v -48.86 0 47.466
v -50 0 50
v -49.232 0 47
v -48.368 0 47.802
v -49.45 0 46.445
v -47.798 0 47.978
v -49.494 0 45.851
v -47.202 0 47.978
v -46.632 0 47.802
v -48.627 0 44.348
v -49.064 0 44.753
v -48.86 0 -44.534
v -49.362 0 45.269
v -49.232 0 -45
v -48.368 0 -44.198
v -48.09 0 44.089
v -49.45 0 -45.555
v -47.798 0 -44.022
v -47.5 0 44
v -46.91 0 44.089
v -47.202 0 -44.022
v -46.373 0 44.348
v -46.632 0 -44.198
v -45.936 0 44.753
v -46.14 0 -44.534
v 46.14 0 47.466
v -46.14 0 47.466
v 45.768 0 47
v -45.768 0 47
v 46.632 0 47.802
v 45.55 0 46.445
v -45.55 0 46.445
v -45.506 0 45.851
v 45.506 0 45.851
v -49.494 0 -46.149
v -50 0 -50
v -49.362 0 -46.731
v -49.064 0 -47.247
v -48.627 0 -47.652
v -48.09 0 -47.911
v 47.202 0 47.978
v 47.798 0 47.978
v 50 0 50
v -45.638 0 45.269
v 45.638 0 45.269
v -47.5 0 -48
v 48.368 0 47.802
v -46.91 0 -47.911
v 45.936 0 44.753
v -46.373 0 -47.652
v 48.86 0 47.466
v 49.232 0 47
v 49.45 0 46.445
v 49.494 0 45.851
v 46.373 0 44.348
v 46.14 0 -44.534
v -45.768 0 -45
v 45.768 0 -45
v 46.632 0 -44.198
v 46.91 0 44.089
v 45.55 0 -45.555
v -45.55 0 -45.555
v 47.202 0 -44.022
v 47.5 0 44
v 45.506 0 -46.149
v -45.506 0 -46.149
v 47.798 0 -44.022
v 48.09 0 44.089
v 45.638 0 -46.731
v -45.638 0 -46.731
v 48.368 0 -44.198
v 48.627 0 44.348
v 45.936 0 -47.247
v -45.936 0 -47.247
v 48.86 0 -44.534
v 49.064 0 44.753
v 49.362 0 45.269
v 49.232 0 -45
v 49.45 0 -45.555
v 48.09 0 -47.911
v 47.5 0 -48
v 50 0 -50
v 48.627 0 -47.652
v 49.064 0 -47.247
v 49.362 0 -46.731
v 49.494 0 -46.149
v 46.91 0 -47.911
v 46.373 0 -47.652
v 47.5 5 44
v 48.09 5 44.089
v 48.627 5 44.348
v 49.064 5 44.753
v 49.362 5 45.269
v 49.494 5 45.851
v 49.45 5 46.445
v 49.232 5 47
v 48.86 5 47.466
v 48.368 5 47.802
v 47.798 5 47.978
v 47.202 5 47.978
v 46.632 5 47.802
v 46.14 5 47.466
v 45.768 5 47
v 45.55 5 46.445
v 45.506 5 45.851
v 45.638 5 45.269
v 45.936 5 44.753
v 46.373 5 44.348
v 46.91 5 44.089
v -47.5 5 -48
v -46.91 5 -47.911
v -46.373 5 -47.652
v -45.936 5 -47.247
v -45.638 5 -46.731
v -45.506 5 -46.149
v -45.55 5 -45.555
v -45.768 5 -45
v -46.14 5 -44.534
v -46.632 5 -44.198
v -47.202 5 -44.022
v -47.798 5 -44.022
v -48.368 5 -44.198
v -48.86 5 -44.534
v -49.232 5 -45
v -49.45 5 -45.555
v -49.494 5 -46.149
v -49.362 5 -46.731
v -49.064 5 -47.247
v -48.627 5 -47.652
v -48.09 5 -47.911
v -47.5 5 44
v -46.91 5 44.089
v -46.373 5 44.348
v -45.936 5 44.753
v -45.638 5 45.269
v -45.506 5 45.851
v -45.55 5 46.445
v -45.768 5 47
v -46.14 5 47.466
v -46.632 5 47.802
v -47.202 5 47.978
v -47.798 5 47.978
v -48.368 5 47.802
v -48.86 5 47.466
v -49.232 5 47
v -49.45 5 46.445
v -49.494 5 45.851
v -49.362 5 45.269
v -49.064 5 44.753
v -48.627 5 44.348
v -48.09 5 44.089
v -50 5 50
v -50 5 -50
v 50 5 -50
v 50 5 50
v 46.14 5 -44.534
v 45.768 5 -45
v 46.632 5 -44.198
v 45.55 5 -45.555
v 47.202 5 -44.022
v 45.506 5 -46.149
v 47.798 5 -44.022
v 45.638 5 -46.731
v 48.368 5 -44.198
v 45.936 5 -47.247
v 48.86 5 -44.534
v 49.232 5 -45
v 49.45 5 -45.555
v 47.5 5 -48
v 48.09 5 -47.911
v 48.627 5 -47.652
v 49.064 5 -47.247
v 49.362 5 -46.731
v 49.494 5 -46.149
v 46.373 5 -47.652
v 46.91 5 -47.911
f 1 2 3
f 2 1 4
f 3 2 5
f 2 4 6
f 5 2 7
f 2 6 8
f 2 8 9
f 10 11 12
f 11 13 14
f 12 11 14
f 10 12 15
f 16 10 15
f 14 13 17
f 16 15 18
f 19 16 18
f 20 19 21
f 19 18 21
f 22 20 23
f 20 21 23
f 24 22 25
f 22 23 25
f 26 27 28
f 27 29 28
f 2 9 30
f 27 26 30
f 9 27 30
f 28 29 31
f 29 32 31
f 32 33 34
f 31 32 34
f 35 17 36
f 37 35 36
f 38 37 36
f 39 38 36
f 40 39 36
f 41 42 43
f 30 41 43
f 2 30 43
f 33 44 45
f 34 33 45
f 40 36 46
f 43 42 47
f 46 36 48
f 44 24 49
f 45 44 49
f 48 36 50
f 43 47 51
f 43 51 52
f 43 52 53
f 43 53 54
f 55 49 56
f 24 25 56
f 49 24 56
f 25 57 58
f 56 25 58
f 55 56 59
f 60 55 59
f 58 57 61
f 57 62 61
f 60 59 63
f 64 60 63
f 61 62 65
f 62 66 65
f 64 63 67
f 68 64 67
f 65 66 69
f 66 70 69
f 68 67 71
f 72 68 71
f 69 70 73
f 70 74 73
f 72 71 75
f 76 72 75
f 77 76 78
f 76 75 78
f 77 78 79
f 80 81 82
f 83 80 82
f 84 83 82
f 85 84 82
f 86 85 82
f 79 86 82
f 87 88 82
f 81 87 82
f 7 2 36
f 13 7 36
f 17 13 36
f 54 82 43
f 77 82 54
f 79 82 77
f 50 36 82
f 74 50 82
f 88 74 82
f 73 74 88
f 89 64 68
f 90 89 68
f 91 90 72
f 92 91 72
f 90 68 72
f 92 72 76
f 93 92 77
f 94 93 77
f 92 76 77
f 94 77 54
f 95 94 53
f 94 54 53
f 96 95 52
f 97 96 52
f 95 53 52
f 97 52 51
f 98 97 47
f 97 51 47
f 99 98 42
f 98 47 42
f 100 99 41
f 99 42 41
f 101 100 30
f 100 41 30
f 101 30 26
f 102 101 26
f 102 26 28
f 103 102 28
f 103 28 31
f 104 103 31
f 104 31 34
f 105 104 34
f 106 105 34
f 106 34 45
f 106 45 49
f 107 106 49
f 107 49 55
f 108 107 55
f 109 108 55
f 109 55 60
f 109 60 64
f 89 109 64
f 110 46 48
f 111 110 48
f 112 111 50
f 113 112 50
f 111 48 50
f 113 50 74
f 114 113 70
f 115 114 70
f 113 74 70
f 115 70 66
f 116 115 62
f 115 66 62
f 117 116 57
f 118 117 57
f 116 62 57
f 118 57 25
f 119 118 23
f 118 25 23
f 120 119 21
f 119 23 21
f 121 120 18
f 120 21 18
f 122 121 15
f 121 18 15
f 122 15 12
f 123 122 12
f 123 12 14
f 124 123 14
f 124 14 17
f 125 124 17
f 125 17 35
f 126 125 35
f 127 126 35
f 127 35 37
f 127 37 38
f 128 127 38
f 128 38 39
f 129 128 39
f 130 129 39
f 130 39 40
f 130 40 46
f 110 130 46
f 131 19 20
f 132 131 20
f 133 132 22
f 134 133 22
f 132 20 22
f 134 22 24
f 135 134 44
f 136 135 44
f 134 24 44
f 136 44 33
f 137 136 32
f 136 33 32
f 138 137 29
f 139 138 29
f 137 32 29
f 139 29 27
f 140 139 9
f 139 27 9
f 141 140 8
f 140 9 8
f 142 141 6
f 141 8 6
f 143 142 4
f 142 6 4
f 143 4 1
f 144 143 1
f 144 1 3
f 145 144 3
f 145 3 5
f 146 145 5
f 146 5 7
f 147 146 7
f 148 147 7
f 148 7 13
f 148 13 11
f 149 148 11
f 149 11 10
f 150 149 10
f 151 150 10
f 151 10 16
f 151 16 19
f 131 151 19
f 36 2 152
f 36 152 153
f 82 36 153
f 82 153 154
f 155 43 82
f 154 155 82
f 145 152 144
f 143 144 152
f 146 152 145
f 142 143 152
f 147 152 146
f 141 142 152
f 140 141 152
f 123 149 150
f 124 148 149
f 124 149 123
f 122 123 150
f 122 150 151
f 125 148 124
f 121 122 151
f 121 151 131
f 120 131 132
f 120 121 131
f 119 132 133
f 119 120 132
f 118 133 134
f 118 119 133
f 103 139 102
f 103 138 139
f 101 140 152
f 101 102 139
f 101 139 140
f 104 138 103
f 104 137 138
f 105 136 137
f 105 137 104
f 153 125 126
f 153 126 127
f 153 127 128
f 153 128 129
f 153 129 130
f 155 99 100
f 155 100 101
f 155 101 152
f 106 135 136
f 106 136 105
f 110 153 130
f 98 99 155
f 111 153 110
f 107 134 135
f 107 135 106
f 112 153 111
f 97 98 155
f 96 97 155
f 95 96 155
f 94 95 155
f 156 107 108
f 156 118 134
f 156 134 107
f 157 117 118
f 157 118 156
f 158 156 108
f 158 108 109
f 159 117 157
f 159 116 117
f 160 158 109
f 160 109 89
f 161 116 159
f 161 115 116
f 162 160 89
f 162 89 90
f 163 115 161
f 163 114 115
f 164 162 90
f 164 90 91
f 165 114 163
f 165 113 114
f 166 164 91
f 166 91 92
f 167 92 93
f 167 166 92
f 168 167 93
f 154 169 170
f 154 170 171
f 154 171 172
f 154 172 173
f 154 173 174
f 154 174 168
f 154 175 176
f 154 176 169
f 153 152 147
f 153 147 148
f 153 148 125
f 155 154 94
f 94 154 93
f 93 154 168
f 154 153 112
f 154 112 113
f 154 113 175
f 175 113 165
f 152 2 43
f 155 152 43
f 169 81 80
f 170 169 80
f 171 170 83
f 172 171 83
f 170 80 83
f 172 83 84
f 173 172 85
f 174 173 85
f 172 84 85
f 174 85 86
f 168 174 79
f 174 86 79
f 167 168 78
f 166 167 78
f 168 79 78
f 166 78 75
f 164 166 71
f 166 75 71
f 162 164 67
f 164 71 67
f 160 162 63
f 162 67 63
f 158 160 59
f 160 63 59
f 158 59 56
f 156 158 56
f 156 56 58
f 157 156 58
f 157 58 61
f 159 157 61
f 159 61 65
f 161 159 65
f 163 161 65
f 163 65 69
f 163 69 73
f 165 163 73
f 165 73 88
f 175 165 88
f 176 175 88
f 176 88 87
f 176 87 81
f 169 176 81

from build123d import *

# Parameters (mm, degrees)
SKETCH1_W                 = 100
SKETCH1_H                 = 100
BOSS_EXTRUDE1_DEPTH       = 5
F_4_0MM_DOWEL_HOLE1_D     = 4
F_4_0MM_DOWEL_HOLE1_DEPTH = 5


with BuildPart() as part:
    # Sketch1 → Boss-Extrude1 (new body)
    with BuildSketch(Plane(origin=(0, 0, 0), x_dir=(1, 0, 0), z_dir=(0, 1, 0))):
        Rectangle(SKETCH1_W, SKETCH1_H)
    extrude(amount=BOSS_EXTRUDE1_DEPTH)

    # Ø4.0mm Dowel Hole1
    with Locations(Plane(origin=(-47.5, 5, -46), x_dir=(0, 0, 1), z_dir=(0, 1, 0))):
        with Locations((0, 0), (0, 95), (92, 95), (92, 0)):
            Hole(F_4_0MM_DOWEL_HOLE1_D / 2, depth=F_4_0MM_DOWEL_HOLE1_DEPTH)


solid = part.part
